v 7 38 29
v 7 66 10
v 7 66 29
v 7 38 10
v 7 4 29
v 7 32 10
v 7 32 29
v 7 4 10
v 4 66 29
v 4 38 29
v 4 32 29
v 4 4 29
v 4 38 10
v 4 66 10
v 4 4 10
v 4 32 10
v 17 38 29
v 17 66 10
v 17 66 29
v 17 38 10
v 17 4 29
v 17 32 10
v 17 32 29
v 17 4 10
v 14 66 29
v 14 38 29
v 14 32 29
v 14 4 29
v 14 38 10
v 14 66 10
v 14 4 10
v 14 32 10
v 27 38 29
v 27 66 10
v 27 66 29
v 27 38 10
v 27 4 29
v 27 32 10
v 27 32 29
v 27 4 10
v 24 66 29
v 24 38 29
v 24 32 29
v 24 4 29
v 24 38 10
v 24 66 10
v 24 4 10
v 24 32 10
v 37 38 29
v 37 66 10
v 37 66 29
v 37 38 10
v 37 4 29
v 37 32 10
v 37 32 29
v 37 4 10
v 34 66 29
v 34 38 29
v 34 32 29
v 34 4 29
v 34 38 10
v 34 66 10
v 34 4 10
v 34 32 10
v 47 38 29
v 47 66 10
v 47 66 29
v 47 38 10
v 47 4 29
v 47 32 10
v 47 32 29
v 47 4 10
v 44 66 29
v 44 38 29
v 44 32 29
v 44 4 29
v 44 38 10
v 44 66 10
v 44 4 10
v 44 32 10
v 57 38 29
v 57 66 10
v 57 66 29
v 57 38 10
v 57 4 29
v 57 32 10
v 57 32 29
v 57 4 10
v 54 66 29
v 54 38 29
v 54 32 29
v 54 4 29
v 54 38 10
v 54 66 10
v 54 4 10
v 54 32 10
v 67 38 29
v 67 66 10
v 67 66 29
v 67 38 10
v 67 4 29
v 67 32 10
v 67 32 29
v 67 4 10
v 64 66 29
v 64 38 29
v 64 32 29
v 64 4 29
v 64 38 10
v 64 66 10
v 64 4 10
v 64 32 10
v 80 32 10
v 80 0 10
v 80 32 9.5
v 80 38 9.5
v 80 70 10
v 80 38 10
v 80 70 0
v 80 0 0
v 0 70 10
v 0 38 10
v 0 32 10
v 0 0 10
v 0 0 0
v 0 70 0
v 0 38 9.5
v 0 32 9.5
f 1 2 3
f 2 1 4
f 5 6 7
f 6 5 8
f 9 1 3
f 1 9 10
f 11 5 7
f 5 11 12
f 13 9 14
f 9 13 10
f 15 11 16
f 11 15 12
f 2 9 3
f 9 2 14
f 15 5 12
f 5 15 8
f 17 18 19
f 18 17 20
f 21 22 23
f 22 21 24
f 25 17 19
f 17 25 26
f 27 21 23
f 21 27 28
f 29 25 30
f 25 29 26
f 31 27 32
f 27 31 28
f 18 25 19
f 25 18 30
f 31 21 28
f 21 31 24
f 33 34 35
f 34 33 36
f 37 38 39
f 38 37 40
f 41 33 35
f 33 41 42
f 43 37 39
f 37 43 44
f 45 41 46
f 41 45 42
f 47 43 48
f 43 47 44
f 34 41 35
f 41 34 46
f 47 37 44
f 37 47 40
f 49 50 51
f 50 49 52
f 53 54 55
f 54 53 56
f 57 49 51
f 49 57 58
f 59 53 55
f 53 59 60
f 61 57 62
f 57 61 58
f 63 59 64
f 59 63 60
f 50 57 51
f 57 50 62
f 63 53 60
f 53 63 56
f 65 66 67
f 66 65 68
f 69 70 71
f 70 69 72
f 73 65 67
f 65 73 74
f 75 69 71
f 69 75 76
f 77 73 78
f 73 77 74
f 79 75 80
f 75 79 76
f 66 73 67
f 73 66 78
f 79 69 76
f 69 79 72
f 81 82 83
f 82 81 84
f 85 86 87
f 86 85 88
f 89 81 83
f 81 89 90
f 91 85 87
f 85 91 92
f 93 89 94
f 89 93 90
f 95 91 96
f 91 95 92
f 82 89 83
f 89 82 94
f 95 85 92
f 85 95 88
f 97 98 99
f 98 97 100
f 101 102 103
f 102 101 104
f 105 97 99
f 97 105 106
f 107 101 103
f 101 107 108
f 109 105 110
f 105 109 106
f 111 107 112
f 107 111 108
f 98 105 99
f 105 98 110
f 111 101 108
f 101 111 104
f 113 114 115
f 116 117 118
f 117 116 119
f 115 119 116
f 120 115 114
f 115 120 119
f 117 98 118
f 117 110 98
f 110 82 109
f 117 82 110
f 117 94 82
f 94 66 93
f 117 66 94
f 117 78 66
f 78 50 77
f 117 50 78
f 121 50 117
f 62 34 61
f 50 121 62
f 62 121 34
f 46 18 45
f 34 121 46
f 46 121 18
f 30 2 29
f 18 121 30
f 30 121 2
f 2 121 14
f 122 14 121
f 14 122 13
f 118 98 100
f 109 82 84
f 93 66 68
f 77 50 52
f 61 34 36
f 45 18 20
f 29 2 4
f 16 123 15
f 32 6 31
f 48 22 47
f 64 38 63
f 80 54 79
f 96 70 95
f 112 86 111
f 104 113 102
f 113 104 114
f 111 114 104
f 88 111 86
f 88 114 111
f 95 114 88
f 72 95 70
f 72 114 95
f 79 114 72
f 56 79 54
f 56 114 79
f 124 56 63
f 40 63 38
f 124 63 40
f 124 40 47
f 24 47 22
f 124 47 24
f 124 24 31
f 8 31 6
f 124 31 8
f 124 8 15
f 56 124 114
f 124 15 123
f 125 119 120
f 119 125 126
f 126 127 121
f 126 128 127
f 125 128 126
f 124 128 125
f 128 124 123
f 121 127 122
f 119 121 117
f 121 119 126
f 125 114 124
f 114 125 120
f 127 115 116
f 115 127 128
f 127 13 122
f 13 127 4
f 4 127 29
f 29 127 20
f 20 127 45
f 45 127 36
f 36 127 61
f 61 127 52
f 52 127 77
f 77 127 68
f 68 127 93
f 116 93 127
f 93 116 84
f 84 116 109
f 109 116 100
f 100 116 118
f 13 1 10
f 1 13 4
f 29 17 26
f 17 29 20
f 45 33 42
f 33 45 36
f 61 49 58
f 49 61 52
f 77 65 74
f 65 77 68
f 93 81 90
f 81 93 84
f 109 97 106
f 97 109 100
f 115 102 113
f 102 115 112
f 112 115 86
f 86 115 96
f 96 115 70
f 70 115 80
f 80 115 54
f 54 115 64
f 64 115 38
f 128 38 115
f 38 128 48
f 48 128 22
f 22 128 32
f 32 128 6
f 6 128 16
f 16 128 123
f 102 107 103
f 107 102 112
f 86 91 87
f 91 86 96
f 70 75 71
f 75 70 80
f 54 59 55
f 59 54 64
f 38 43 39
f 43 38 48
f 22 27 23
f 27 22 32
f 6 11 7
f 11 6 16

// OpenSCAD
$fn = 32;

// ----------------------------------------------------------------------
// Heatsink: slotted fin block
// ----------------------------------------------------------------------

// --- parameters (mm) ---
base_l = 80;              // base length, X
base_w = 70;              // base width, Y
base_t = 10;              // base plate thickness
fin_h = 20;               // fin height above the base
fin_t = 3;                // fin thickness
edge = 4;                 // margin from the base ends
pitch = 10;               // fin pitch
slot_w = 6;               // central slot width, Y
fit_tol = 0.02;           // tolerance for press fits, mm
free_tol = 0.2;           // tolerance for clearance fits, mm

n_fins = floor((base_l - 2 * edge - fin_t) / pitch) + 1;  // fin count
total_h = base_t + fin_h - 1;  // overall height

difference() {
union() {
  cube([base_l, base_w, base_t]);
  for (i = [0 : n_fins - 1])
    translate([edge + i * pitch, edge, base_t - 1])
      cube([fin_t, base_w - 2 * edge, fin_h]);
}
  translate([-1, base_w / 2 - slot_w / 2, base_t - 0.5])
    cube([base_l + 2, slot_w, fin_h + 2]);
}
